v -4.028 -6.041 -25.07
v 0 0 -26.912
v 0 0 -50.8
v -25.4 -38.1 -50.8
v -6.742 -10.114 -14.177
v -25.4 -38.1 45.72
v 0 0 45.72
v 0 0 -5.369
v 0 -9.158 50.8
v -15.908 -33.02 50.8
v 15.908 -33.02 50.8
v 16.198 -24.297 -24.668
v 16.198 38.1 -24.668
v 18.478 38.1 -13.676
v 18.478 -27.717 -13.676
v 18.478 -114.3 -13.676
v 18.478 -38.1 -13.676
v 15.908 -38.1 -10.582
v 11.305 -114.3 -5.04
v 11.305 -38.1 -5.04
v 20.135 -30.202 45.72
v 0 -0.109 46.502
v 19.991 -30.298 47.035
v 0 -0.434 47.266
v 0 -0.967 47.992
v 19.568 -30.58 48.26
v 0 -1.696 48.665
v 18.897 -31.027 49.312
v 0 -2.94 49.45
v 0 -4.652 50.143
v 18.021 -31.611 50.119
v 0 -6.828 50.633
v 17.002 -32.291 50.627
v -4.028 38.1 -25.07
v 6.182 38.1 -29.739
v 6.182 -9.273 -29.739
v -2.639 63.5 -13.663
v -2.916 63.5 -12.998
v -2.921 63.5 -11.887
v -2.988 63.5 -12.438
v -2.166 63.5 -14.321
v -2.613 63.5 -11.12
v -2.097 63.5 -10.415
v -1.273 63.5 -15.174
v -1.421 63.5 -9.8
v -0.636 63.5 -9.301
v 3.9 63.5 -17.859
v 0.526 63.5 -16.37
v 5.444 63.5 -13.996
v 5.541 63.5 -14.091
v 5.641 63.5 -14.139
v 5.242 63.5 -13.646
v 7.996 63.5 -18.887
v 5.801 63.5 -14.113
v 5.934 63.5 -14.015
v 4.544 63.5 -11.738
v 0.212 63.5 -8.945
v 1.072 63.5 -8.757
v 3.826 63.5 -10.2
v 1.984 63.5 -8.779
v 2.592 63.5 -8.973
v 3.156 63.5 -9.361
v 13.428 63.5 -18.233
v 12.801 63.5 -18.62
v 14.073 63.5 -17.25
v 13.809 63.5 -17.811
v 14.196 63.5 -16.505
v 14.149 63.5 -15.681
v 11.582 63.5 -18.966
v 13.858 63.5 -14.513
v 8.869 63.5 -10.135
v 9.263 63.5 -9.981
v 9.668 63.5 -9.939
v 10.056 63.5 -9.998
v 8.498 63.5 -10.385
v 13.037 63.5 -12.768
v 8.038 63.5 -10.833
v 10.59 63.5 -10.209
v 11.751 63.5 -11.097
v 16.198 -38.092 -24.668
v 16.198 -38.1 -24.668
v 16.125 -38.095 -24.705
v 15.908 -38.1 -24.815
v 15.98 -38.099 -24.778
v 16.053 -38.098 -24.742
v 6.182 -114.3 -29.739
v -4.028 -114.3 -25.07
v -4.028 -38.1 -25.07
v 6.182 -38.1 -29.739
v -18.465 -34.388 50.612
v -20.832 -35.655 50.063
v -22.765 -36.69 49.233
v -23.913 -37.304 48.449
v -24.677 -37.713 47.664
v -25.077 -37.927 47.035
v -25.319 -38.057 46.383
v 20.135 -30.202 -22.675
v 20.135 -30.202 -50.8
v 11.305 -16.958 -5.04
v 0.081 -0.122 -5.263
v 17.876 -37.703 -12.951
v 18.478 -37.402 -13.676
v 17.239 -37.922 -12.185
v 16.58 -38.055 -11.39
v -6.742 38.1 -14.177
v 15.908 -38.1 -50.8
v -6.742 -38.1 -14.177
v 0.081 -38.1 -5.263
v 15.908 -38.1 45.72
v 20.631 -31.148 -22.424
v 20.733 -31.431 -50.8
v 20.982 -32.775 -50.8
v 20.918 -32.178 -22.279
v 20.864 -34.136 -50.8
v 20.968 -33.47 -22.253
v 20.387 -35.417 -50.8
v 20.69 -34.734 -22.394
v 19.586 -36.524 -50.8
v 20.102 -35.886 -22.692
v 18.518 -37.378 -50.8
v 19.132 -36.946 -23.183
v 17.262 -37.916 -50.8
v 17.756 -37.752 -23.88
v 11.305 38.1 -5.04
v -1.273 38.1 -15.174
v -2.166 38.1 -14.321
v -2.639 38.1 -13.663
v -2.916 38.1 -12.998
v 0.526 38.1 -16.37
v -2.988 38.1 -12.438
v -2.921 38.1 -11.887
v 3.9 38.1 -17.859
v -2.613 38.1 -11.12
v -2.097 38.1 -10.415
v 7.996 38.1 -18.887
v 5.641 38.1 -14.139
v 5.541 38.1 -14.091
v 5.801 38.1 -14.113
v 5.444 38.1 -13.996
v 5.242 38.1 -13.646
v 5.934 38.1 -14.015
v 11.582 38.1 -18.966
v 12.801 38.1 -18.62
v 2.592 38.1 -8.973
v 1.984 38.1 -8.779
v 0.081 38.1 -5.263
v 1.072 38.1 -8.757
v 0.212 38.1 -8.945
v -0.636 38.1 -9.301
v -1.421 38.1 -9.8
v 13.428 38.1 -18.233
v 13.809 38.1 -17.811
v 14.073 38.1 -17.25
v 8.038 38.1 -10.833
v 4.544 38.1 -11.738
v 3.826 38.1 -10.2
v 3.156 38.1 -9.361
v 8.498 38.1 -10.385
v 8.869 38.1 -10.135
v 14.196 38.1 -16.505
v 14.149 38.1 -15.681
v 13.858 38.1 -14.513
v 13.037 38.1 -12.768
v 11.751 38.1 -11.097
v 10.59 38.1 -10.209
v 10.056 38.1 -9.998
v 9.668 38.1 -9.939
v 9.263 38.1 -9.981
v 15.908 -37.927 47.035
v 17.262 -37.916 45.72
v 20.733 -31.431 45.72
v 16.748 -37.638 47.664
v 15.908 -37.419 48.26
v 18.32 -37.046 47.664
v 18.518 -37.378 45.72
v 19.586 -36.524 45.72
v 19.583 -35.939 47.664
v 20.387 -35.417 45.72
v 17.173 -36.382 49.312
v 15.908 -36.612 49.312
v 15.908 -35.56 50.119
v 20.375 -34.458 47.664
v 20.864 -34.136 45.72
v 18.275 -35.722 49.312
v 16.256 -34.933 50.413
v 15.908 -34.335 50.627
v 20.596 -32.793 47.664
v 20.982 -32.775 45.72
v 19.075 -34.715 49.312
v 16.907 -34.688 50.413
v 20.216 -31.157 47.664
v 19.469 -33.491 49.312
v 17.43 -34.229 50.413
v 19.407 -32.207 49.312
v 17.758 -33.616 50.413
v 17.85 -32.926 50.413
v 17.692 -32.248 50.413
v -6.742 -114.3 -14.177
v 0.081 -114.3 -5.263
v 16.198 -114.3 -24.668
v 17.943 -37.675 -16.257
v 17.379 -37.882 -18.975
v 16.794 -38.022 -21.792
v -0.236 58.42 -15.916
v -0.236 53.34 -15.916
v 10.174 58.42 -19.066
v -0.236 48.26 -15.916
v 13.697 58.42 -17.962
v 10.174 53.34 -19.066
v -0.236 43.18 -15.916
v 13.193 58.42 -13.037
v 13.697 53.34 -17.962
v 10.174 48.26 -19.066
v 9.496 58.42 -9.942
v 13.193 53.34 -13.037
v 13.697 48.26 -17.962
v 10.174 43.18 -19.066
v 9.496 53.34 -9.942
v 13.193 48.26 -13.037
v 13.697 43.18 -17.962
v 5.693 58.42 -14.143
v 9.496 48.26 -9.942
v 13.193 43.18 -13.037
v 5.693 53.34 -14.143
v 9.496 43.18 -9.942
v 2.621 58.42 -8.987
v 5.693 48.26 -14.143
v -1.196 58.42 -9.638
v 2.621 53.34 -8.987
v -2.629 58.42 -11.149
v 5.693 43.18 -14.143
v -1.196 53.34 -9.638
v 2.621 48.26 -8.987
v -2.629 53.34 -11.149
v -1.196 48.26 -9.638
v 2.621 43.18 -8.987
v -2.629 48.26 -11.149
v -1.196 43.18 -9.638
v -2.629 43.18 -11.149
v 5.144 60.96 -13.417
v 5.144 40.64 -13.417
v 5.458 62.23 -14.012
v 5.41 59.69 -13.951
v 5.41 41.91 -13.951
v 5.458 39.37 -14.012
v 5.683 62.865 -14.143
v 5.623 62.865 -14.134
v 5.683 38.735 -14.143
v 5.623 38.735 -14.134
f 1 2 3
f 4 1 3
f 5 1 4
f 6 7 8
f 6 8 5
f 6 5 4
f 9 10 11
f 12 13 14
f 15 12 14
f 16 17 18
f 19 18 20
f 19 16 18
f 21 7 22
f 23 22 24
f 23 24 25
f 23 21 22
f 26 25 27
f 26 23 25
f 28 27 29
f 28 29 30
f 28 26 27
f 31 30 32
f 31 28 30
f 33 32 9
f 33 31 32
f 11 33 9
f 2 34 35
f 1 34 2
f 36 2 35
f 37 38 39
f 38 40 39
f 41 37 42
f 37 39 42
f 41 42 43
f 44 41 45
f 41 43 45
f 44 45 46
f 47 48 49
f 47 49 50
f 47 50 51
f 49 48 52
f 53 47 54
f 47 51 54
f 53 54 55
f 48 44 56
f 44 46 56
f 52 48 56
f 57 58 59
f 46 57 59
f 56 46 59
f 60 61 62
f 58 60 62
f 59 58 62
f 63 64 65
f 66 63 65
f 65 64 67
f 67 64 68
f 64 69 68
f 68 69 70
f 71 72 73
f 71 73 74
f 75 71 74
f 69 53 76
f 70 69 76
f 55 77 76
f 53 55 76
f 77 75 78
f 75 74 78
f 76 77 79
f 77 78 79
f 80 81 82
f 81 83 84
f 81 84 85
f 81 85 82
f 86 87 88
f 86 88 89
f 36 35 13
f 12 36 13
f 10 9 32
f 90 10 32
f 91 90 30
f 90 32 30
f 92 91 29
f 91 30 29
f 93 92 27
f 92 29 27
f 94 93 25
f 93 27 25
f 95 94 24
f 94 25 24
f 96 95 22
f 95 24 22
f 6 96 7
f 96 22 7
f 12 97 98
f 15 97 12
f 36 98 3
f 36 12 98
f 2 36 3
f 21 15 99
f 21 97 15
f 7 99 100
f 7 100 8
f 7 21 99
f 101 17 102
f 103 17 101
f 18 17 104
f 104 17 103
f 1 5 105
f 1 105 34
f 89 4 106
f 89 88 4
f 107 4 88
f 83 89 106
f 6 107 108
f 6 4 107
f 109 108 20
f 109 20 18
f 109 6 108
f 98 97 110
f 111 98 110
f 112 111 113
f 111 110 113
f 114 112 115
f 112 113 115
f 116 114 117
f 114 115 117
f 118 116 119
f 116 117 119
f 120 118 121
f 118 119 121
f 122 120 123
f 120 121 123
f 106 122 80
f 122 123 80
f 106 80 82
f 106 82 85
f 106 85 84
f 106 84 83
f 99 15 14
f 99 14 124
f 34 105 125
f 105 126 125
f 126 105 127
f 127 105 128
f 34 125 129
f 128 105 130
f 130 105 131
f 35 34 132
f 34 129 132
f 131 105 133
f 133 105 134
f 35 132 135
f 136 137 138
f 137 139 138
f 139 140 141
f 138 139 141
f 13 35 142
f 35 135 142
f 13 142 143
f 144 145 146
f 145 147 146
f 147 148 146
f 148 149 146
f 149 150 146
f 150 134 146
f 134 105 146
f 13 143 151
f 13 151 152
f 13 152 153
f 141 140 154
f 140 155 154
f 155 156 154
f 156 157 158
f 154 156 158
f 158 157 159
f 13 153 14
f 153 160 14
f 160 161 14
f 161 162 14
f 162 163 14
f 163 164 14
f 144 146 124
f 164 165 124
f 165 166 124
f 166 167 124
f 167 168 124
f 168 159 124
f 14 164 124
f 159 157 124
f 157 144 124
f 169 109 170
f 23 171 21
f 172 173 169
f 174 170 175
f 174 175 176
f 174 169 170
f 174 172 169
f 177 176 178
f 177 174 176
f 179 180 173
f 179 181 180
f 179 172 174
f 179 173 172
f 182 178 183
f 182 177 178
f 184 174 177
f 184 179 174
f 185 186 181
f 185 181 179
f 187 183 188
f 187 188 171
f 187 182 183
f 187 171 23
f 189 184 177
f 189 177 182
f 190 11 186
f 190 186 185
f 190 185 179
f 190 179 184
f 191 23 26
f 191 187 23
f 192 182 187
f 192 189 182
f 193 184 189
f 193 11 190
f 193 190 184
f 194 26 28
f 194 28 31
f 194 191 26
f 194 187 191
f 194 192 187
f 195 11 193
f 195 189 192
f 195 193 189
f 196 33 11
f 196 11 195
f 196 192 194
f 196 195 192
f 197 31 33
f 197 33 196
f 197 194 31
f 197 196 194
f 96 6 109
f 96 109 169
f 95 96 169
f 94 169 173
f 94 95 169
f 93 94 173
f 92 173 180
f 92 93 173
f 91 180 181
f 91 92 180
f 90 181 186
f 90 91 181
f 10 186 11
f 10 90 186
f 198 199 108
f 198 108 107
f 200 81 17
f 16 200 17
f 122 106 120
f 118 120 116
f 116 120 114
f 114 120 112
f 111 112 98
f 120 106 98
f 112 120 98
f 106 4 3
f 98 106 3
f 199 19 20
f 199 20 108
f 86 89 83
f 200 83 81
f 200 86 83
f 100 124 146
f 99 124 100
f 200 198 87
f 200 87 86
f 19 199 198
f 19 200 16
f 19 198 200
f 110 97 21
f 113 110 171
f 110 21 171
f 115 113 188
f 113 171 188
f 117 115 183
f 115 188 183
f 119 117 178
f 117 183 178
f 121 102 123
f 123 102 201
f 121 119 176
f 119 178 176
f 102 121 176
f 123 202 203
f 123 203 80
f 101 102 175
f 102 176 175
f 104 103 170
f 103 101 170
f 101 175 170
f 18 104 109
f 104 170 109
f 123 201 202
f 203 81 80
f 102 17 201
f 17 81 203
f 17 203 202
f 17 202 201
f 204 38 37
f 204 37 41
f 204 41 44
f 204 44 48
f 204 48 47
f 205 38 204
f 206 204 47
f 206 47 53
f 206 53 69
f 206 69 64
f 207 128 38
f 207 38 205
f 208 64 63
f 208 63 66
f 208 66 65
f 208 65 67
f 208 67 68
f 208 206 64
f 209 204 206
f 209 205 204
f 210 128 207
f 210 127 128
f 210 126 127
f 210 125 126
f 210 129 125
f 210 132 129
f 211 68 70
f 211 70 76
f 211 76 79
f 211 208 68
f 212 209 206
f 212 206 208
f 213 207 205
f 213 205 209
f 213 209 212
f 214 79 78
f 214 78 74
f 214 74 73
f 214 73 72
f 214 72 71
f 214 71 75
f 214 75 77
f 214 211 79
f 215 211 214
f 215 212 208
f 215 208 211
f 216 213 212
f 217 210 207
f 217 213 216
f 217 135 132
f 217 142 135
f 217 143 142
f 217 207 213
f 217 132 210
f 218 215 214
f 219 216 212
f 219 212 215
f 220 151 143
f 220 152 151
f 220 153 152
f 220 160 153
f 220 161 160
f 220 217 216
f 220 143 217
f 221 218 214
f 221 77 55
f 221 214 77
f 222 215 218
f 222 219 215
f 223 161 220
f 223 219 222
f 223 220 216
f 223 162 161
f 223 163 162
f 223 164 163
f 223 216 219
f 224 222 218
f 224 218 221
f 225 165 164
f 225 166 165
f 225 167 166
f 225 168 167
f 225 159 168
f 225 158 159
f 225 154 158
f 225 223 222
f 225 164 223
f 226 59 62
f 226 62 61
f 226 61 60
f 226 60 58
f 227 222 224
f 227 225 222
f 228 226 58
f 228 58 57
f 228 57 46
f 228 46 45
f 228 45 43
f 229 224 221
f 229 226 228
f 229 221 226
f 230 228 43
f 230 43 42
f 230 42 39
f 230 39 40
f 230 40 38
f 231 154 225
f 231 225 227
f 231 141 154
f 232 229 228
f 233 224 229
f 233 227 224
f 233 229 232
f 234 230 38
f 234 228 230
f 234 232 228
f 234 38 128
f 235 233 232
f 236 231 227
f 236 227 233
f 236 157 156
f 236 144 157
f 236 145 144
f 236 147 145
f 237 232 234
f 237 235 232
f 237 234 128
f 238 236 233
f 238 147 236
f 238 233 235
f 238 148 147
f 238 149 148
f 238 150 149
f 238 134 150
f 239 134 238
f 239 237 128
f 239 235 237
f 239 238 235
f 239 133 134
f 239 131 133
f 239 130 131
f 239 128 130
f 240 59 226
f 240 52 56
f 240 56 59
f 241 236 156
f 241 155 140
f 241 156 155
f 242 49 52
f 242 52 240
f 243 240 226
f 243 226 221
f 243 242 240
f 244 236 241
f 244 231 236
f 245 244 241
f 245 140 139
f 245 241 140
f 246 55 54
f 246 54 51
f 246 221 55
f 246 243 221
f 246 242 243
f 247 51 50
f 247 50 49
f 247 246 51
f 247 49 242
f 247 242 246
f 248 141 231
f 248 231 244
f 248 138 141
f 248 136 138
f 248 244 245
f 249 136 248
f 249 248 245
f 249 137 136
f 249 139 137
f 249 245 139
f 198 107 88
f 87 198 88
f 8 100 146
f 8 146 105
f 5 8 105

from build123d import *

# Parameters (mm, degrees)
F1_DEPTH     = 50.8
F3_DEPTH     = 76.2
F5_DEPTH     = 25.4
F6_T1_DEPTH  = 48.9984343719
F6_T3_DEPTH  = 71.1905011984
F6_T5_DEPTH  = 54.0079331735
F6_T10_DEPTH = 5.08
F6_T16_DEPTH = 120.2501670661
F6_T22_DEPTH = 120.2501670661
F6_T29_DEPTH = 120.2501670661
F6_T35_DEPTH = 120.2501670661
F6_T42_DEPTH = 120.2501670661
F6_T49_DEPTH = 120.2501670661


# Not quite as in the source:
# - a fillet or chamfer that OpenCascade refuses, or shapes differently, is made with other operations: its cross-section is extruded or revolved along the edge and cut away or added


with BuildPart() as f1:
    # F0 (on Top) → F1 (new body, symmetric)
    with BuildSketch(Plane.XY):
        Polygon((25.4, -38.1), (0, 0), (-25.4, -38.1), align=None)
    extrude(amount=F1_DEPTH, both=True)

    # F2 (on face) → F3 (join, symmetric)
    with BuildSketch(Plane.XZ.offset(38.1)):
        Polygon((0.0813317902, -5.2626694994), (-6.7424972958, -14.1770650191), (-4.0275300761, -25.0701841258), (6.1818077576, -29.739285953), (16.197676584, -24.6684415925), (18.4779228904, -13.6761002742), (11.3054746994, -5.0397192136), align=None)
    extrude(amount=F3_DEPTH, both=True)

    # F4 (on face) → F5 (join)
    with BuildSketch(Plane(origin=(0, 38.1, 0), x_dir=(-1, 0, 0), z_dir=(0, 1, 0))):
        with BuildLine():
            add(Edge.make_bspline(
                [(2.9162010178, -12.9975462332), (1.8670415569, -17.0409513366), (-20.5549326749, -23.97997421), (-9.0441910265, -5.0233845041), (-5.2404331156, -18.2414045319), (-4.2889415012, -5.528991709), (3.5750196715, -10.4584939673), (2.9162010178, -12.9975462332)],
                knots=[0, 0, 0, 0, 0.2848563236, 0.490695137, 0.6535359084, 0.8211247512, 1, 1, 1, 1], degree=3))
        make_face()
    extrude(amount=F5_DEPTH)

    # F6: fillet of radius 5.08 on 4 edges, made by hand

    # F6_s2 → F6_t1 (cut)
    with BuildSketch(Plane(origin=(20.1347486688, -30.2021230032, 0), x_dir=(0, 0, 1), z_dir=(-0.5547001962, 0.8320502943, 0))):
        with BuildLine():
            ThreePointArc((45.72, 0), (49.3121024484, -1.4878975516), (50.8, -5.08))
            Line((50.8, -5.08), (50.8, 0))
            Line((50.8, 0), (45.72, 0))
        make_face()
    extrude(amount=F6_T1_DEPTH, mode=Mode.SUBTRACT)

    # F6_s4 → F6_t3 (cut)
    with BuildSketch(Plane(origin=(7.0446924921, 10.5670387381, 0), x_dir=(0, 0, 1), z_dir=(-0.5547001962, -0.8320502943, 0))):
        with BuildLine():
            ThreePointArc((50.8, -5.08), (49.3121024484, -1.4878975516), (45.72, 0))
            Line((45.72, 0), (50.8, 0))
            Line((50.8, 0), (50.8, -5.08))
        make_face()
    extrude(amount=F6_T3_DEPTH, mode=Mode.SUBTRACT)

    # F6_s6 → F6_t5 (cut)
    with BuildSketch(Plane.YZ.offset(-38.1)):
        with BuildLine():
            ThreePointArc((-38.1, 45.72), (-36.6121024484, 49.3121024484), (-33.02, 50.8))
            Line((-33.02, 50.8), (-38.1, 50.8))
            Line((-38.1, 50.8), (-38.1, 45.72))
        make_face()
    extrude(amount=F6_T5_DEPTH, mode=Mode.SUBTRACT)


with BuildPart() as f6_tool8:
    # F6_s9 → F6_t10 (new body)
    with BuildSketch(Plane.XY.offset(45.72)):
        Polygon((15.9079331735, -33.02), (20.1347486688, -30.2021230032), (25.4, -38.1), (15.9079331735, -38.1), align=None)
    extrude(amount=F6_T10_DEPTH)

    # F6_s11 → F6_t12 (revolve, cut)
    with BuildSketch(Plane(origin=(15.9079331735, -33.02, 45.72), x_dir=(-0.8816745988, 0.4718579255, 0), z_dir=(0.4718579255, 0.8816745988, 0))):
        with BuildLine():
            ThreePointArc((0, -5.08), (5.08, 0), (0, 5.08))
            Line((0, 5.08), (0, -5.08))
        make_face()
    revolve(axis=Axis((15.9079331735, -33.02, 45.72), (0, 0, 1)), mode=Mode.SUBTRACT)


with BuildPart() as f1_1:
    add(f1.part)

    # F6_t7: cut F6_tool8
    add(f6_tool8.part, mode=Mode.SUBTRACT)


with BuildPart() as f6_tool14:
    # F6_s15 → F6_t16 (new body)
    with BuildSketch(Plane.XY.offset(45.72)):
        with BuildLine():
            ThreePointArc((20.1347486688, -30.2021230032), (20.3868401353, -35.4170382617), (15.9079331735, -38.1))
            Line((15.9079331735, -38.1), (25.4, -38.1))
            Line((25.4, -38.1), (20.1347486688, -30.2021230032))
        make_face()
    extrude(amount=-F6_T16_DEPTH)

    split(bisect_by=Plane(origin=(20.4355225798, 0, -4.2391355518), x_dir=(0, 1, 0), z_dir=(-0.9791548002, 0, 0.2031154284)), keep=Keep.TOP)

    split(bisect_by=Plane(origin=(4.2137378339, 0, 3.4994769327), x_dir=(0, 1, 0), z_dir=(0.7692950689, 0, 0.6388936508)), keep=Keep.TOP)


with BuildPart() as f1_2:
    add(f1_1.part)

    # F6_t13: cut F6_tool14
    add(f6_tool14.part, mode=Mode.SUBTRACT)


with BuildPart() as f6_tool20:
    # F6_s21 → F6_t22 (new body)
    with BuildSketch(Plane.XY.offset(45.72)):
        with BuildLine():
            ThreePointArc((20.1347486688, -30.2021230032), (20.3868401353, -35.4170382617), (15.9079331735, -38.1))
            Line((15.9079331735, -38.1), (25.4, -38.1))
            Line((25.4, -38.1), (20.1347486688, -30.2021230032))
        make_face()
    extrude(amount=-F6_T22_DEPTH)

    split(bisect_by=Plane(origin=(13.2457923387, 0, -26.1629245812), x_dir=(0, 1, 0), z_dir=(-0.4516909958, 0, 0.8921744472)), keep=Keep.TOP)

    split(bisect_by=Plane(origin=(20.4355225798, 0, -4.2391355518), x_dir=(0, 1, 0), z_dir=(0.9791548002, 0, -0.2031154284)), keep=Keep.TOP)

    split(bisect_by=Plane(origin=(4.2137378339, 0, 3.4994769327), x_dir=(0, 1, 0), z_dir=(0.7692950689, 0, 0.6388936508)), keep=Keep.TOP)


with BuildPart() as f1_3:
    add(f1_2.part)

    # F6_t19: cut F6_tool20
    add(f6_tool20.part, mode=Mode.SUBTRACT)


with BuildPart() as f6_tool27:
    # F6_s28 → F6_t29 (new body)
    with BuildSketch(Plane.XY.offset(45.72)):
        with BuildLine():
            ThreePointArc((20.1347486688, -30.2021230032), (20.3868401353, -35.4170382617), (15.9079331735, -38.1))
            Line((15.9079331735, -38.1), (25.4, -38.1))
            Line((25.4, -38.1), (20.1347486688, -30.2021230032))
        make_face()
    extrude(amount=-F6_T29_DEPTH)

    split(bisect_by=Plane(origin=(13.2457923387, 0, -26.1629245812), x_dir=(0, 1, 0), z_dir=(0.4516909958, 0, -0.8921744472)), keep=Keep.TOP)

    split(bisect_by=Plane(origin=(20.4355225798, 0, -4.2391355518), x_dir=(0, 1, 0), z_dir=(-0.9791548002, 0, 0.2031154284)), keep=Keep.TOP)


with BuildPart() as f1_4:
    add(f1_3.part)

    # F6_t26: cut F6_tool27
    add(f6_tool27.part, mode=Mode.SUBTRACT)


with BuildPart() as f6_tool33:
    # F6_s34 → F6_t35 (new body)
    with BuildSketch(Plane.XY.offset(45.72)):
        with BuildLine():
            ThreePointArc((20.1347486688, -30.2021230032), (20.3868401353, -35.4170382617), (15.9079331735, -38.1))
            Line((15.9079331735, -38.1), (25.4, -38.1))
            Line((25.4, -38.1), (20.1347486688, -30.2021230032))
        make_face()
    extrude(amount=-F6_T35_DEPTH)

    split(bisect_by=Plane(origin=(13.2457923387, 0, -26.1629245812), x_dir=(0, 1, 0), z_dir=(-0.4516909958, 0, 0.8921744472)), keep=Keep.TOP)

    split(bisect_by=Plane(origin=(20.4355225798, 0, -4.2391355518), x_dir=(0, 1, 0), z_dir=(0.9791548002, 0, -0.2031154284)), keep=Keep.TOP)

    split(bisect_by=Plane(origin=(4.2137378339, 0, 3.4994769327), x_dir=(0, 1, 0), z_dir=(-0.7692950689, 0, -0.6388936508)), keep=Keep.TOP)


with BuildPart() as f1_5:
    add(f1_4.part)

    # F6_t32: cut F6_tool33
    add(f6_tool33.part, mode=Mode.SUBTRACT)


with BuildPart() as f6_tool40:
    # F6_s41 → F6_t42 (new body)
    with BuildSketch(Plane.XY.offset(45.72)):
        with BuildLine():
            ThreePointArc((20.1347486688, -30.2021230032), (20.3868401353, -35.4170382617), (15.9079331735, -38.1))
            Line((15.9079331735, -38.1), (25.4, -38.1))
            Line((25.4, -38.1), (20.1347486688, -30.2021230032))
        make_face()
    extrude(amount=-F6_T42_DEPTH)

    split(bisect_by=Plane(origin=(13.2457923387, 0, -26.1629245812), x_dir=(0, 1, 0), z_dir=(0.4516909958, 0, -0.8921744472)), keep=Keep.TOP)

    split(bisect_by=Plane(origin=(20.4355225798, 0, -4.2391355518), x_dir=(0, 1, 0), z_dir=(0.9791548002, 0, -0.2031154284)), keep=Keep.TOP)

    split(bisect_by=Plane(origin=(4.2137378339, 0, 3.4994769327), x_dir=(0, 1, 0), z_dir=(-0.7692950689, 0, -0.6388936508)), keep=Keep.TOP)


with BuildPart() as f1_6:
    add(f1_5.part)

    # F6_t39: cut F6_tool40
    add(f6_tool40.part, mode=Mode.SUBTRACT)


with BuildPart() as f6_tool47:
    # F6_s48 → F6_t49 (new body)
    with BuildSketch(Plane.XY.offset(45.72)):
        with BuildLine():
            ThreePointArc((20.1347486688, -30.2021230032), (20.3868401353, -35.4170382617), (15.9079331735, -38.1))
            Line((15.9079331735, -38.1), (25.4, -38.1))
            Line((25.4, -38.1), (20.1347486688, -30.2021230032))
        make_face()
    extrude(amount=-F6_T49_DEPTH)

    split(bisect_by=Plane(origin=(13.2457923387, 0, -26.1629245812), x_dir=(0, 1, 0), z_dir=(0.4516909958, 0, -0.8921744472)), keep=Keep.TOP)

    split(bisect_by=Plane(origin=(4.2137378339, 0, 3.4994769327), x_dir=(0, 1, 0), z_dir=(0.7692950689, 0, 0.6388936508)), keep=Keep.TOP)


with BuildPart() as f1_7:
    add(f1_6.part)

    # F6_t46: cut F6_tool47
    add(f6_tool47.part, mode=Mode.SUBTRACT)


solid = f1_7.part
